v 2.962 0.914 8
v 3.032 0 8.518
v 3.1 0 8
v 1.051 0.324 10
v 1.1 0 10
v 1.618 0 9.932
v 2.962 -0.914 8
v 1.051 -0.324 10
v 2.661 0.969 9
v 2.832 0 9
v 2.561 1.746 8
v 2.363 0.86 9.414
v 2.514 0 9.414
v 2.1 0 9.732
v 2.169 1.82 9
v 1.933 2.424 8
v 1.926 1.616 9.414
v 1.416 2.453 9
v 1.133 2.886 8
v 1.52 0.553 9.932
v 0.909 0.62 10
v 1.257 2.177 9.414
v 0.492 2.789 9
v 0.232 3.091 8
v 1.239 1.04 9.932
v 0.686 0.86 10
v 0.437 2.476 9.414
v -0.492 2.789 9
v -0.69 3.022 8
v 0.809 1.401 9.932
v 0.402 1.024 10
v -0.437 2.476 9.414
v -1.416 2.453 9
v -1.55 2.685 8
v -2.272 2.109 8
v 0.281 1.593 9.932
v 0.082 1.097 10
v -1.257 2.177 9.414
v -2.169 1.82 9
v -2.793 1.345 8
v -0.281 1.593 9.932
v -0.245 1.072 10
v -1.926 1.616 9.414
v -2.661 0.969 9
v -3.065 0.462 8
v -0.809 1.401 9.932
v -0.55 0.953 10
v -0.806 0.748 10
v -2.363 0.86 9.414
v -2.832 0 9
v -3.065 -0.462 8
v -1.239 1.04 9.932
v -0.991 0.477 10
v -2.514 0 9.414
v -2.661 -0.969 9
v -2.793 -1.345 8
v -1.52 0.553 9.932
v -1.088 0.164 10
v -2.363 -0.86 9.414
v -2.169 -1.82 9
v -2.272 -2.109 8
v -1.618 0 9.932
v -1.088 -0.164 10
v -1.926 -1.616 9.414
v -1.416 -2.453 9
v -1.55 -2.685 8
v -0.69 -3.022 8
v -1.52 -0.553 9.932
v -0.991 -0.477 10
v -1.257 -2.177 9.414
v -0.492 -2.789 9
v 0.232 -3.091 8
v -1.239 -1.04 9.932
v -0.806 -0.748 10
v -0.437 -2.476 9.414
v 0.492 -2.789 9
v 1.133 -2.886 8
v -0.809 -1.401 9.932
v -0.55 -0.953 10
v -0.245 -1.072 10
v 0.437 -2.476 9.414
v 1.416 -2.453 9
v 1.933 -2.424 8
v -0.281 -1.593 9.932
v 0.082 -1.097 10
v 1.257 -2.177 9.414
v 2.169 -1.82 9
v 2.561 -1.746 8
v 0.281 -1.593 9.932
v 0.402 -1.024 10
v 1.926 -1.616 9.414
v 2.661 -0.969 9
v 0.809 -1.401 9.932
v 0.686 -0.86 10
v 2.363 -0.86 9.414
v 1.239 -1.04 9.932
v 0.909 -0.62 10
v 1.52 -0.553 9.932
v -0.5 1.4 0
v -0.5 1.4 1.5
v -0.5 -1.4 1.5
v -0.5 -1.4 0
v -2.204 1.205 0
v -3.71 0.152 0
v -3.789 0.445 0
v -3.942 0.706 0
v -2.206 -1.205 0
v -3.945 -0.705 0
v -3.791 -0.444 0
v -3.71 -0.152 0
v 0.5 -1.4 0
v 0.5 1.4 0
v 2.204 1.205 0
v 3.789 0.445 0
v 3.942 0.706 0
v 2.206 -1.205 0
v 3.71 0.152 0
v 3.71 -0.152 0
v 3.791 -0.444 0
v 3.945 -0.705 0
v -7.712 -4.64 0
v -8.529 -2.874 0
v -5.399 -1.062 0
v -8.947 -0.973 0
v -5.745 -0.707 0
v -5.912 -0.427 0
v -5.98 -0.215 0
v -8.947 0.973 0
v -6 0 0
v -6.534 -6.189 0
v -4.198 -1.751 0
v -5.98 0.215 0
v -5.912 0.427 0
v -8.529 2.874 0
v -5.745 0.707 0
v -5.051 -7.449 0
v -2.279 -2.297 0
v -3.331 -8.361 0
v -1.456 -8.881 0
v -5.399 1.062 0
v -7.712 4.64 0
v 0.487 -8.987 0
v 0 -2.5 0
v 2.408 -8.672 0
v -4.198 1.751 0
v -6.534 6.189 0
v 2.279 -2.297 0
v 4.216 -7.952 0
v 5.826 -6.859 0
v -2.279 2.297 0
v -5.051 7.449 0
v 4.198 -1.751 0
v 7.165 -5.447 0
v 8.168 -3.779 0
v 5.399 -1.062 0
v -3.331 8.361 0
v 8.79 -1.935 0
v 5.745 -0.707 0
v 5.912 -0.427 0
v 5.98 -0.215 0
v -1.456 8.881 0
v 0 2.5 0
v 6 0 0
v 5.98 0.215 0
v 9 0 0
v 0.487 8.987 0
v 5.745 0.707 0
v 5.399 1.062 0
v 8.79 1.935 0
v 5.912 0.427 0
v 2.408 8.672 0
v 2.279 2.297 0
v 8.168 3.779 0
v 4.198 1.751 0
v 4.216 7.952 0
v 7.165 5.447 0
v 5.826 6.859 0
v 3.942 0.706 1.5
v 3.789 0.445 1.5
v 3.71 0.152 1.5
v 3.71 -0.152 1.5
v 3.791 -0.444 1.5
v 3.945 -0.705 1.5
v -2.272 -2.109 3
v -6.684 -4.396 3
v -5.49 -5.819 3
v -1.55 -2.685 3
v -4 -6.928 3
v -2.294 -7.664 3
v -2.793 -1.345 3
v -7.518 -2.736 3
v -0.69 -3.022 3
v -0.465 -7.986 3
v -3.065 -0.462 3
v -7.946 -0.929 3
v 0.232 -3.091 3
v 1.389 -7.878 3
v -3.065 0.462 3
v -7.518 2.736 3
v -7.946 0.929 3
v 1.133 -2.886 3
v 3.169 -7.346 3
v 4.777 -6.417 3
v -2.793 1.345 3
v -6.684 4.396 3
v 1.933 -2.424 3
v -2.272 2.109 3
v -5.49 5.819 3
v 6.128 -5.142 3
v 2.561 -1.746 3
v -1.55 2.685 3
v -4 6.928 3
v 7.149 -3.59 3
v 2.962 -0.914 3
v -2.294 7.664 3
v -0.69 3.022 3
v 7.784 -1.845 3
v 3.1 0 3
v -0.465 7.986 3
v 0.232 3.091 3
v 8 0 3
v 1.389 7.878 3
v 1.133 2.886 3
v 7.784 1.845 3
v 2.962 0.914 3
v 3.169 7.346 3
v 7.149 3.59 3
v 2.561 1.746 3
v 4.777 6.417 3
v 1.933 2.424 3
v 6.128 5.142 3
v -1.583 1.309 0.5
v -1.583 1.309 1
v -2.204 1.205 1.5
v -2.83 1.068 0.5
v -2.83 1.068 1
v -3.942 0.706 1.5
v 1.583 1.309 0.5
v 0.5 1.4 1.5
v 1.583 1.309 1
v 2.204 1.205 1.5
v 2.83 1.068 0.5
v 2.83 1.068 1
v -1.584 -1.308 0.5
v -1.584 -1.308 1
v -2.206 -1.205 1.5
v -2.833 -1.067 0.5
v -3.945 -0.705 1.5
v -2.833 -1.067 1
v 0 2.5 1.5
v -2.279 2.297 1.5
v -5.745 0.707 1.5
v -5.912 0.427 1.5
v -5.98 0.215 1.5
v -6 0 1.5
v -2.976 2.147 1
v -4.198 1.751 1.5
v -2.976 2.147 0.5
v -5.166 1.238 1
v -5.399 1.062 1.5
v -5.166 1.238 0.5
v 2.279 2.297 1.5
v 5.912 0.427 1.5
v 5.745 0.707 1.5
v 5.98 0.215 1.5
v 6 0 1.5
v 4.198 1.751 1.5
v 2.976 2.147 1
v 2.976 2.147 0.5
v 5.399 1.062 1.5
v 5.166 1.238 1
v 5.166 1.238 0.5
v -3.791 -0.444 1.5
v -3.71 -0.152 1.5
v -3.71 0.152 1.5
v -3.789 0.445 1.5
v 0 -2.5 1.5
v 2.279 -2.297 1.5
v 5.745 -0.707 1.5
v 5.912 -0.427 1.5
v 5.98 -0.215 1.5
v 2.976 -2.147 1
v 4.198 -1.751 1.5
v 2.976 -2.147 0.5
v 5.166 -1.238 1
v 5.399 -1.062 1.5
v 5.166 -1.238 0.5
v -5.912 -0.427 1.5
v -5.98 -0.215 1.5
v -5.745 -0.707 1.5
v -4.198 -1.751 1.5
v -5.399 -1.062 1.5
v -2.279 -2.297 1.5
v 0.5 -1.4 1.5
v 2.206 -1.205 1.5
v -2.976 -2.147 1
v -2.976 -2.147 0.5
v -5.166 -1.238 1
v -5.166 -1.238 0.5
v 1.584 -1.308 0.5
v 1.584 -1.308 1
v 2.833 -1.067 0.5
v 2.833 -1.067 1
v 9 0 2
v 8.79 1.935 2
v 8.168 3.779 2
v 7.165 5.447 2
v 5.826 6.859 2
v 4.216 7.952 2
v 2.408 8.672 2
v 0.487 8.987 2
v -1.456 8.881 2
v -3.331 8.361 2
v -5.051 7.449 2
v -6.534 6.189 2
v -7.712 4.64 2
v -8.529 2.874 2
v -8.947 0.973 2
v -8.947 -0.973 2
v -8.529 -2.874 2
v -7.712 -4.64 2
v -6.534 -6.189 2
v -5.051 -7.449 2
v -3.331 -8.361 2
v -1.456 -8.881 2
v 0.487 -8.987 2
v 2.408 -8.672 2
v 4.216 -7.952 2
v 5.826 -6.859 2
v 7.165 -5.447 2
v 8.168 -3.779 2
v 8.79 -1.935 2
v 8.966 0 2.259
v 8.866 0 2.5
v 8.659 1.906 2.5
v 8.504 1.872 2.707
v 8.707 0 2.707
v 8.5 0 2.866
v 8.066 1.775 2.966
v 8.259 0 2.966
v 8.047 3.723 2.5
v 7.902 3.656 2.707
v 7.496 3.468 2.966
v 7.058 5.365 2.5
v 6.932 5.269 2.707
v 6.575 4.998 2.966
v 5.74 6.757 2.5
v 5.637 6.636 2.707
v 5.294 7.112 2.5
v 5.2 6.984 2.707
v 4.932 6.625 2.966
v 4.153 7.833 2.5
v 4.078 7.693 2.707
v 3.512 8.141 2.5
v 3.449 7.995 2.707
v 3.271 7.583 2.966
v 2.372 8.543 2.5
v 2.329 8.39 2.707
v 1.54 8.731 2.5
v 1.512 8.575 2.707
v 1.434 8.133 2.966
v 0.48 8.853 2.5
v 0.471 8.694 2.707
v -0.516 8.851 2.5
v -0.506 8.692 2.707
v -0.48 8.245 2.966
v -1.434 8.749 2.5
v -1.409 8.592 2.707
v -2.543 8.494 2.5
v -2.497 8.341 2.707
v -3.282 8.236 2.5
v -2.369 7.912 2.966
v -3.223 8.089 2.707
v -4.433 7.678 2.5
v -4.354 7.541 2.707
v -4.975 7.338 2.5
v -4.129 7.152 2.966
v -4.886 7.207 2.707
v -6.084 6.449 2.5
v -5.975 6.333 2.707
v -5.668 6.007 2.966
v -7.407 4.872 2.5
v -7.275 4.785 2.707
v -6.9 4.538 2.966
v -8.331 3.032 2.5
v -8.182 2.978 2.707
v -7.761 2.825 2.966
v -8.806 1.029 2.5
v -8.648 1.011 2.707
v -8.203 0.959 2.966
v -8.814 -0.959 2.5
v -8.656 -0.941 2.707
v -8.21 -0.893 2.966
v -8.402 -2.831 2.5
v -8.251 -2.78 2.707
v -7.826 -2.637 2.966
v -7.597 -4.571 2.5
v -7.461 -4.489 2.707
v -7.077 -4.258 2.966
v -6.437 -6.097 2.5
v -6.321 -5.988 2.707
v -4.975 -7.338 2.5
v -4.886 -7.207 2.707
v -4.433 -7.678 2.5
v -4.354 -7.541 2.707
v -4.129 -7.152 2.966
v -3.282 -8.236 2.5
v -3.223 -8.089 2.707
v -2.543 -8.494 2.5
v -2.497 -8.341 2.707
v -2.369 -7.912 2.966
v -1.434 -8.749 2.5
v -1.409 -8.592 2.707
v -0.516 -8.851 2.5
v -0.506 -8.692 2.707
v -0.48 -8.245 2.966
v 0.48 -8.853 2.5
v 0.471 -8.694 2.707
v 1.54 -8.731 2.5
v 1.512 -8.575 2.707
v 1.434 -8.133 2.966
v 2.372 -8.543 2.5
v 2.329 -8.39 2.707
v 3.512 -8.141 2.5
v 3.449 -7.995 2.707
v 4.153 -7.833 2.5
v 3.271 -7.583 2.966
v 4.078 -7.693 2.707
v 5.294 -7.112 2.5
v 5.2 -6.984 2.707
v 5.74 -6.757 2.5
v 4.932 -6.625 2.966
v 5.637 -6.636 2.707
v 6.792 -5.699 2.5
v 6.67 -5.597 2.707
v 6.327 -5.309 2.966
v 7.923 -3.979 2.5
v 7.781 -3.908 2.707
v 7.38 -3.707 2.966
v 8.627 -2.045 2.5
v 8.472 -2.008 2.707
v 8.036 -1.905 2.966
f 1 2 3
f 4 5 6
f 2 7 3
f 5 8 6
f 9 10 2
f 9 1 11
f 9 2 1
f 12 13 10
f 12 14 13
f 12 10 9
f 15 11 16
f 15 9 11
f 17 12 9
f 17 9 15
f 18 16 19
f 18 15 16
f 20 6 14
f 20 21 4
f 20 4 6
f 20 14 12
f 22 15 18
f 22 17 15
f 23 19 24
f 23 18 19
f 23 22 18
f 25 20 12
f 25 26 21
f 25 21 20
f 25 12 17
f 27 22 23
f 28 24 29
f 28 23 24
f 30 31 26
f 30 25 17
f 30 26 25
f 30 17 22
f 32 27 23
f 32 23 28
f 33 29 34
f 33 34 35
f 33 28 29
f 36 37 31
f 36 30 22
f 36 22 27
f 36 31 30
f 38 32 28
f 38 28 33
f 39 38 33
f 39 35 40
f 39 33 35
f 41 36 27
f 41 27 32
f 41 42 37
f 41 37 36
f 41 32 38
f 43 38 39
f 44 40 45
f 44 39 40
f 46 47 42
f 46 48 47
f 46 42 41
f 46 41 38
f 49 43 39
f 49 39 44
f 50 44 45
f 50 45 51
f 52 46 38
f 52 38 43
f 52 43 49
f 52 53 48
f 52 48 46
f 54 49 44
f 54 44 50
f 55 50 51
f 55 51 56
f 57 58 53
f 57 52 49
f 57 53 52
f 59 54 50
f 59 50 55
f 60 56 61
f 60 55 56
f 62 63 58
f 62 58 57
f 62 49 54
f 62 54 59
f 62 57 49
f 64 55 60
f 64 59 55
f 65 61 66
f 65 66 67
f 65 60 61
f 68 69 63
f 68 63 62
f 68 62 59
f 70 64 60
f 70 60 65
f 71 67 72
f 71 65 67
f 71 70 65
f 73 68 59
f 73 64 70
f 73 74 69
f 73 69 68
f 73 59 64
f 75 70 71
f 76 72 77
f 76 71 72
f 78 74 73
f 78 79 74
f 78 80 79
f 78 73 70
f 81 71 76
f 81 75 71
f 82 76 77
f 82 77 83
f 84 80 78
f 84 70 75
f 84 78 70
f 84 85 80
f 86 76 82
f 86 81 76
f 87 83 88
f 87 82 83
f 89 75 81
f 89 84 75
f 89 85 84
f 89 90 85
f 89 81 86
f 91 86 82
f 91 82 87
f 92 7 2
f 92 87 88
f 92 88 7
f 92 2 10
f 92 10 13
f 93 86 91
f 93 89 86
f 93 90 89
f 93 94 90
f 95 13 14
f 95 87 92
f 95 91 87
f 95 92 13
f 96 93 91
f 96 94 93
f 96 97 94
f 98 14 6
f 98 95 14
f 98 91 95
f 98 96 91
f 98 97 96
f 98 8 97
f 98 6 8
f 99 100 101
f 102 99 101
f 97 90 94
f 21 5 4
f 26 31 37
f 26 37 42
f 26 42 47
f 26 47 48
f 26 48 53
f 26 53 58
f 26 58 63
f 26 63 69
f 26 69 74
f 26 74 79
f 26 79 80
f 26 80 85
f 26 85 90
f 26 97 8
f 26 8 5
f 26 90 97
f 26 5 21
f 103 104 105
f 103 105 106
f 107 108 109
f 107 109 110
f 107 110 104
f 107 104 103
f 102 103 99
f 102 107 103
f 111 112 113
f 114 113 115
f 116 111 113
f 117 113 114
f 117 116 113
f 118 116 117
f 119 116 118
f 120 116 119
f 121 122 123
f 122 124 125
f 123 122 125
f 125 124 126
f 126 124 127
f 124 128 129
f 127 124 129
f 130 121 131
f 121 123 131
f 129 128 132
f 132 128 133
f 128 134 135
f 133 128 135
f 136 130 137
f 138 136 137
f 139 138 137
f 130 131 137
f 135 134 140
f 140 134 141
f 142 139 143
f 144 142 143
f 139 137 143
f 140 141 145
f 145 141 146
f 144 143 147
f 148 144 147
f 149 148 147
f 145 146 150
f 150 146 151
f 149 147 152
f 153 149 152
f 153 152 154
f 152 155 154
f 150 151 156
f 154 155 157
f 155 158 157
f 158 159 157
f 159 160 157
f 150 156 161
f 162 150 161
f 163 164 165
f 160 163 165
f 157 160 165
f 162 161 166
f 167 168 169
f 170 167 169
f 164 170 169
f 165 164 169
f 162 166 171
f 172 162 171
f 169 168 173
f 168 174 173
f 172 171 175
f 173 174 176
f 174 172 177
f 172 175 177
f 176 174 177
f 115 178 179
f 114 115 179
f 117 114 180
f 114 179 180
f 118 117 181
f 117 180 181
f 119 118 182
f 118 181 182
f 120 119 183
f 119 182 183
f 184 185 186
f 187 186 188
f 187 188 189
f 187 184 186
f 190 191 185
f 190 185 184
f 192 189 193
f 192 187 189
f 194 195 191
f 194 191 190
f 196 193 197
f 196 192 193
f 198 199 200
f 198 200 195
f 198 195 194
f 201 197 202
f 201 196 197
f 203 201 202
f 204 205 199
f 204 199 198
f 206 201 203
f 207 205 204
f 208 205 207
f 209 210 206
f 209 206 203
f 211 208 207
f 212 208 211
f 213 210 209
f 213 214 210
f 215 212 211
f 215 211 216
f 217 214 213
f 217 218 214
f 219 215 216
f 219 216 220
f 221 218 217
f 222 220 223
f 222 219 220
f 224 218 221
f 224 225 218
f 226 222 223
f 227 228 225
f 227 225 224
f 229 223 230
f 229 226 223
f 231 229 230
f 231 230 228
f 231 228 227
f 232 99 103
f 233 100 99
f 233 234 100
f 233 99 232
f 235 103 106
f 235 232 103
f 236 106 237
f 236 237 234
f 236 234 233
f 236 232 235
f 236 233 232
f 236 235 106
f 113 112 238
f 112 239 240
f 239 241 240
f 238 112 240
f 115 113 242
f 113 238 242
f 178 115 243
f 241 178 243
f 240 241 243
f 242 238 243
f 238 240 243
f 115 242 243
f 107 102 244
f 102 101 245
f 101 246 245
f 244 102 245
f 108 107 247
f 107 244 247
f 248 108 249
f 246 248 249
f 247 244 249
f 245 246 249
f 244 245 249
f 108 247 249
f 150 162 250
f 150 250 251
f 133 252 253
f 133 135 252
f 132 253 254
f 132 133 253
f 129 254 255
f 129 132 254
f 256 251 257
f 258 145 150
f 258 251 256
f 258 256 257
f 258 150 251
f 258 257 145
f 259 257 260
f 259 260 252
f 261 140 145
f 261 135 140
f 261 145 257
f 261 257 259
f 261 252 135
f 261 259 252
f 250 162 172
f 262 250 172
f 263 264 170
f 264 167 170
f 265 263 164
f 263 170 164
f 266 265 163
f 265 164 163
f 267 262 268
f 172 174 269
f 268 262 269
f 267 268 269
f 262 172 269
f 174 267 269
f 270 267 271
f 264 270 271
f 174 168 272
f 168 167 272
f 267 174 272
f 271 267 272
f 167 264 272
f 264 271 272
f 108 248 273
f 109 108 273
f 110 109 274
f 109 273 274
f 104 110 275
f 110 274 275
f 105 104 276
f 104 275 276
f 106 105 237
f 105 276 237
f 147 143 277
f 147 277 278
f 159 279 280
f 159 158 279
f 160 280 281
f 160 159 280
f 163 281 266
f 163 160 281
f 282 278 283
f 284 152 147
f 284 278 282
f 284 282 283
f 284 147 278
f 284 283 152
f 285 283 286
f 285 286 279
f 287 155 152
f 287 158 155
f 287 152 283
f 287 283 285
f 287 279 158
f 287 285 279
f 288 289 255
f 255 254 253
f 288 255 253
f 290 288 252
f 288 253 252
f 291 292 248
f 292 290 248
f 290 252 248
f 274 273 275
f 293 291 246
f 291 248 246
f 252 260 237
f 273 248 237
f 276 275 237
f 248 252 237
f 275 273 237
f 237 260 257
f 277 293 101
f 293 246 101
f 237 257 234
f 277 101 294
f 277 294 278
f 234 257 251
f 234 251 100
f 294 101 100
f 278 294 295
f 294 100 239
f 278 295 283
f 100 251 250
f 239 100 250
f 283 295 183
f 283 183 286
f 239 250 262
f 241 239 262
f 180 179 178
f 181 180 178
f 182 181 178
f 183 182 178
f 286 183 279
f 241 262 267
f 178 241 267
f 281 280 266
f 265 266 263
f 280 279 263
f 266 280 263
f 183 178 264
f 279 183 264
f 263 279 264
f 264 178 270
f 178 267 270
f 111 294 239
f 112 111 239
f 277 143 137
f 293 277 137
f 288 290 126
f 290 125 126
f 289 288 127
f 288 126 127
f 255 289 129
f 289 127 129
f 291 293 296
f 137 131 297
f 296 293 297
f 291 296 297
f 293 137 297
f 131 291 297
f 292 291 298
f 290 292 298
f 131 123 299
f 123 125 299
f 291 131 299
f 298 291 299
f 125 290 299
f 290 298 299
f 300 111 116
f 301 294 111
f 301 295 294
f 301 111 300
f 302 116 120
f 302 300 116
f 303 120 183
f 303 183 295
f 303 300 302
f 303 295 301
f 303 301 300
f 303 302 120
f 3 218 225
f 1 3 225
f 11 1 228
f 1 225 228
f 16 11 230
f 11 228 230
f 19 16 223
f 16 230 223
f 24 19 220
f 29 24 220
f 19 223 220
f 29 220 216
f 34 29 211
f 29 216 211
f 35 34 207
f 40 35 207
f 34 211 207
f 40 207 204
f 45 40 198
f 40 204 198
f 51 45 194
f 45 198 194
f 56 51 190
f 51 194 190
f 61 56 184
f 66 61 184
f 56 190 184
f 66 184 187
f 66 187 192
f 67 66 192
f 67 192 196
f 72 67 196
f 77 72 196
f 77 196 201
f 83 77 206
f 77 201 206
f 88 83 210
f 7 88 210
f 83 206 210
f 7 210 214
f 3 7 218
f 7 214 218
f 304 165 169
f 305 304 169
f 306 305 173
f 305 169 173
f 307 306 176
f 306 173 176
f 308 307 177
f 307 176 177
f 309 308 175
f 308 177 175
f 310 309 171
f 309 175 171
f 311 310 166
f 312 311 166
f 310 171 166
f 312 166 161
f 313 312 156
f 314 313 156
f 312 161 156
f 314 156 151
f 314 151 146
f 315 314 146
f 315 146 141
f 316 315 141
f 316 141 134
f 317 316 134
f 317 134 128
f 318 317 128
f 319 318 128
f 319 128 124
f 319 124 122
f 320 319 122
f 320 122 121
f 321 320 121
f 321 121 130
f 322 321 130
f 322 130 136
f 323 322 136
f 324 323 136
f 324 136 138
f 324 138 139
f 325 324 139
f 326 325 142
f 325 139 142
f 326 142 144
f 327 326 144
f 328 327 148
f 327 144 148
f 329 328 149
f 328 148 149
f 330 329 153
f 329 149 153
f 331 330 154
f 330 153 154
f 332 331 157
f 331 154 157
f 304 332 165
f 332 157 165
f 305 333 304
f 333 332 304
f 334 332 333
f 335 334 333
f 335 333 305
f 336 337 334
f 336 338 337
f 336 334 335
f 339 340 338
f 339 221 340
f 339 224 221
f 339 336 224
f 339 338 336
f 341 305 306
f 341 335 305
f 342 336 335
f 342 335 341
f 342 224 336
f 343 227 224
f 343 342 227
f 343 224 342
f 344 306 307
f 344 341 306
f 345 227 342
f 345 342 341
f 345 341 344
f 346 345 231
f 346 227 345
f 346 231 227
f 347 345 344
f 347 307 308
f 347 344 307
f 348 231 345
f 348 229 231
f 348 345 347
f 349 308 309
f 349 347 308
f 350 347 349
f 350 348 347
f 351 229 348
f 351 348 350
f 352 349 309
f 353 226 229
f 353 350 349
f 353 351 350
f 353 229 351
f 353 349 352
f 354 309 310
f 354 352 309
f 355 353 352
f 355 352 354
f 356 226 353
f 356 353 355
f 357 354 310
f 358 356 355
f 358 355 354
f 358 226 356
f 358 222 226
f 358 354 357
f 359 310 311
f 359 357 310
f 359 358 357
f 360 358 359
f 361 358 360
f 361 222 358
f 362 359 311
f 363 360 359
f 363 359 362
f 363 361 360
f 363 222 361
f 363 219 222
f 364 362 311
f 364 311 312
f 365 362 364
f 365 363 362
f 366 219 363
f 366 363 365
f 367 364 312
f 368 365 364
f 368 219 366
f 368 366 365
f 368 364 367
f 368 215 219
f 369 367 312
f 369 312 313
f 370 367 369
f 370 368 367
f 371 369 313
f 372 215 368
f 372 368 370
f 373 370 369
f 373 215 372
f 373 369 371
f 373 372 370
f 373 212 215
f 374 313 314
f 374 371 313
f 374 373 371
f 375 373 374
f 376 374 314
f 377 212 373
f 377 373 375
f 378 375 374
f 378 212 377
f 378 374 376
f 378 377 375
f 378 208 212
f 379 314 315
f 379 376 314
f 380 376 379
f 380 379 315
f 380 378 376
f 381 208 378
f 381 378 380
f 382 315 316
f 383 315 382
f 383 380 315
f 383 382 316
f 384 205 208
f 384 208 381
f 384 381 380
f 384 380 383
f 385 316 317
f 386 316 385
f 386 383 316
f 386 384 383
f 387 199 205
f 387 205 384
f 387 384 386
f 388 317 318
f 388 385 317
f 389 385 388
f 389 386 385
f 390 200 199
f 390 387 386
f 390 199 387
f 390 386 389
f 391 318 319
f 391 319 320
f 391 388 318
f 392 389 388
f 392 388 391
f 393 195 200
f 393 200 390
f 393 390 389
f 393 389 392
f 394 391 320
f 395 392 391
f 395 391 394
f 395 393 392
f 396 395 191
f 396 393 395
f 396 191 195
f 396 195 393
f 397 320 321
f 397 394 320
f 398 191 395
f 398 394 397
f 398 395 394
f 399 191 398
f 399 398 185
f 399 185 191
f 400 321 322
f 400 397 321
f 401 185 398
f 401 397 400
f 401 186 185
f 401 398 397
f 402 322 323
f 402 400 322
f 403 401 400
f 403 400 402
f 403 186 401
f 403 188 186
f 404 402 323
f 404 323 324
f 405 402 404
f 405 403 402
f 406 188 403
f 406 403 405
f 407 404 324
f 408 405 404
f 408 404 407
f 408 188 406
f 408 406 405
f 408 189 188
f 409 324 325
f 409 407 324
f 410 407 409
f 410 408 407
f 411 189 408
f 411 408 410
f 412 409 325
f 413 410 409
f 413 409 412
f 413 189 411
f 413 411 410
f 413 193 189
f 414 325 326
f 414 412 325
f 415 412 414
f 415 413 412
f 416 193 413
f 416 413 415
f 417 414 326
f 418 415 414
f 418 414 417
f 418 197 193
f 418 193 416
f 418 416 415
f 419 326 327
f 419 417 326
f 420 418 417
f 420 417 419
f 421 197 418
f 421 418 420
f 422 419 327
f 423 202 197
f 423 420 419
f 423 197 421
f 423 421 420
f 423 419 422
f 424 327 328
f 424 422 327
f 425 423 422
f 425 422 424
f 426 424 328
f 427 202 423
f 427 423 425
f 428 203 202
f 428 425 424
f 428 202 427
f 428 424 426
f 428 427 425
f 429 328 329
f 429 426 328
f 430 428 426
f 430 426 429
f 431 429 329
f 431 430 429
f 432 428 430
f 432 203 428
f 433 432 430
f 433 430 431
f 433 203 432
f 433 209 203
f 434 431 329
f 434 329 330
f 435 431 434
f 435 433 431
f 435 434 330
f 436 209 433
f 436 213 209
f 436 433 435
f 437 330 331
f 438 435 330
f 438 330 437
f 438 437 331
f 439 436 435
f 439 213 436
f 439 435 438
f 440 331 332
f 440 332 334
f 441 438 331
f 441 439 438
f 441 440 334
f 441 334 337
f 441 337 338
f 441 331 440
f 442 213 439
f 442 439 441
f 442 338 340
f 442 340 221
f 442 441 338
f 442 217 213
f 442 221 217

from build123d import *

# Parameters (mm, degrees)
F0_R     = 9
F1_DEPTH = 1.5
F2_R     = 9
F3_DEPTH = 1.5
F4_R     = 1
F5_R     = 3.1
F6_DEPTH = 7
F7_R     = 2
F9_DEPTH = 1.5


with BuildPart() as f1:
    # F0 (on Top) → F1 (new body)
    with BuildSketch(Plane.XY):
        Circle(F0_R)
        with BuildLine():
            add(Edge.make_bspline(
                [(0, 2.5), (-3.1781503931, 2.4996818975), (-6.0350862332, 1.3276056852), (-6, 0)],
                knots=[0, 0, 0, 0, 6.5, 6.5, 6.5, 6.5], degree=3))
            add(Edge.make_bspline(
                [(0, 2.5), (3.1781503931, 2.4996818975), (6.0350862332, 1.3276056852), (6, 0)],
                knots=[0, 0, 0, 0, 6.5, 6.5, 6.5, 6.5], degree=3))
            add(Edge.make_bspline(
                [(0, -2.5), (3.1781503931, -2.4996818975), (6.0350862332, -1.3276056852), (6, 0)],
                knots=[0, 0, 0, 0, 6.5, 6.5, 6.5, 6.5], degree=3))
            add(Edge.make_bspline(
                [(0, -2.5), (-3.1781503931, -2.4996818975), (-6.0350862332, -1.3276056852), (-6, 0)],
                knots=[0, 0, 0, 0, 6.5, 6.5, 6.5, 6.5], degree=3))
        make_face(mode=Mode.SUBTRACT)
    extrude(amount=F1_DEPTH)

    # F2 (on face) → F3 (join)
    with BuildSketch(Plane.XY.offset(1.5)):
        Circle(F2_R)
    extrude(amount=F3_DEPTH)

    # F4
    f4_edges = [f1.edges().sort_by_distance(p)[0] for p in [
        (-9, 0, 3),
    ]]
    fillet(f4_edges, radius=F4_R)

    # F5 (on face) → F6 (join)
    with BuildSketch(Plane.XY.offset(3)):
        Circle(F5_R)
    extrude(amount=F6_DEPTH)

    # F7
    f7_edges = [f1.edges().sort_by_distance(p)[0] for p in [
        (-3.1, 0, 10),
    ]]
    fillet(f7_edges, radius=F7_R)

    # F8 (on face) → F9 (join, through all)
    with BuildSketch(Plane(origin=(0, 0, 1.5), x_dir=(1, 0, 0), z_dir=(0, 0, -1))):
        with BuildLine():
            Line((0.5, 1.4), (0.5, 0))
            Line((0.5, 0), (0.5, -1.4))
            add(Edge.make_bspline(
                [(0.5, -1.4), (1.399901815, -1.3927484774), (2.9978926484, -1.1190434343), (3.9423397845, -0.7063065555)],
                knots=[0, 0, 0, 0, 2.9529043584, 2.9529043584, 2.9529043584, 2.9529043584], degree=3))
            ThreePointArc((3.9423397845, -0.7063065555), (3.7000016629, -0.0001318249), (3.94520464, 0.705053268))
            add(Edge.make_bspline(
                [(0.5, 1.4), (1.400812364, 1.39274114), (3.0011271582, 1.1184892747), (3.94520464, 0.705053268)],
                knots=[0, 0, 0, 0, 2.9558922002, 2.9558922002, 2.9558922002, 2.9558922002], degree=3))
        make_face()
        with BuildLine():
            Line((-0.5, 0), (-0.5, 1.4))
            add(Edge.make_bspline(
                [(-0.5, 1.4), (-1.400812364, 1.39274114), (-3.0011271582, 1.1184892747), (-3.94520464, 0.705053268)],
                knots=[0, 0, 0, 0, 2.9558922002, 2.9558922002, 2.9558922002, 2.9558922002], degree=3))
            ThreePointArc((-3.94520464, 0.705053268), (-3.7000016629, -0.0001318249), (-3.9423397845, -0.7063065555))
            add(Edge.make_bspline(
                [(-0.5, -1.4), (-1.399901815, -1.3927484774), (-2.9978926484, -1.1190434343), (-3.9423397845, -0.7063065555)],
                knots=[0, 0, 0, 0, 2.9529043584, 2.9529043584, 2.9529043584, 2.9529043584], degree=3))
            Line((-0.5, -1.4), (-0.5, 0))
        make_face()
    extrude(amount=F9_DEPTH)


solid = f1.part
